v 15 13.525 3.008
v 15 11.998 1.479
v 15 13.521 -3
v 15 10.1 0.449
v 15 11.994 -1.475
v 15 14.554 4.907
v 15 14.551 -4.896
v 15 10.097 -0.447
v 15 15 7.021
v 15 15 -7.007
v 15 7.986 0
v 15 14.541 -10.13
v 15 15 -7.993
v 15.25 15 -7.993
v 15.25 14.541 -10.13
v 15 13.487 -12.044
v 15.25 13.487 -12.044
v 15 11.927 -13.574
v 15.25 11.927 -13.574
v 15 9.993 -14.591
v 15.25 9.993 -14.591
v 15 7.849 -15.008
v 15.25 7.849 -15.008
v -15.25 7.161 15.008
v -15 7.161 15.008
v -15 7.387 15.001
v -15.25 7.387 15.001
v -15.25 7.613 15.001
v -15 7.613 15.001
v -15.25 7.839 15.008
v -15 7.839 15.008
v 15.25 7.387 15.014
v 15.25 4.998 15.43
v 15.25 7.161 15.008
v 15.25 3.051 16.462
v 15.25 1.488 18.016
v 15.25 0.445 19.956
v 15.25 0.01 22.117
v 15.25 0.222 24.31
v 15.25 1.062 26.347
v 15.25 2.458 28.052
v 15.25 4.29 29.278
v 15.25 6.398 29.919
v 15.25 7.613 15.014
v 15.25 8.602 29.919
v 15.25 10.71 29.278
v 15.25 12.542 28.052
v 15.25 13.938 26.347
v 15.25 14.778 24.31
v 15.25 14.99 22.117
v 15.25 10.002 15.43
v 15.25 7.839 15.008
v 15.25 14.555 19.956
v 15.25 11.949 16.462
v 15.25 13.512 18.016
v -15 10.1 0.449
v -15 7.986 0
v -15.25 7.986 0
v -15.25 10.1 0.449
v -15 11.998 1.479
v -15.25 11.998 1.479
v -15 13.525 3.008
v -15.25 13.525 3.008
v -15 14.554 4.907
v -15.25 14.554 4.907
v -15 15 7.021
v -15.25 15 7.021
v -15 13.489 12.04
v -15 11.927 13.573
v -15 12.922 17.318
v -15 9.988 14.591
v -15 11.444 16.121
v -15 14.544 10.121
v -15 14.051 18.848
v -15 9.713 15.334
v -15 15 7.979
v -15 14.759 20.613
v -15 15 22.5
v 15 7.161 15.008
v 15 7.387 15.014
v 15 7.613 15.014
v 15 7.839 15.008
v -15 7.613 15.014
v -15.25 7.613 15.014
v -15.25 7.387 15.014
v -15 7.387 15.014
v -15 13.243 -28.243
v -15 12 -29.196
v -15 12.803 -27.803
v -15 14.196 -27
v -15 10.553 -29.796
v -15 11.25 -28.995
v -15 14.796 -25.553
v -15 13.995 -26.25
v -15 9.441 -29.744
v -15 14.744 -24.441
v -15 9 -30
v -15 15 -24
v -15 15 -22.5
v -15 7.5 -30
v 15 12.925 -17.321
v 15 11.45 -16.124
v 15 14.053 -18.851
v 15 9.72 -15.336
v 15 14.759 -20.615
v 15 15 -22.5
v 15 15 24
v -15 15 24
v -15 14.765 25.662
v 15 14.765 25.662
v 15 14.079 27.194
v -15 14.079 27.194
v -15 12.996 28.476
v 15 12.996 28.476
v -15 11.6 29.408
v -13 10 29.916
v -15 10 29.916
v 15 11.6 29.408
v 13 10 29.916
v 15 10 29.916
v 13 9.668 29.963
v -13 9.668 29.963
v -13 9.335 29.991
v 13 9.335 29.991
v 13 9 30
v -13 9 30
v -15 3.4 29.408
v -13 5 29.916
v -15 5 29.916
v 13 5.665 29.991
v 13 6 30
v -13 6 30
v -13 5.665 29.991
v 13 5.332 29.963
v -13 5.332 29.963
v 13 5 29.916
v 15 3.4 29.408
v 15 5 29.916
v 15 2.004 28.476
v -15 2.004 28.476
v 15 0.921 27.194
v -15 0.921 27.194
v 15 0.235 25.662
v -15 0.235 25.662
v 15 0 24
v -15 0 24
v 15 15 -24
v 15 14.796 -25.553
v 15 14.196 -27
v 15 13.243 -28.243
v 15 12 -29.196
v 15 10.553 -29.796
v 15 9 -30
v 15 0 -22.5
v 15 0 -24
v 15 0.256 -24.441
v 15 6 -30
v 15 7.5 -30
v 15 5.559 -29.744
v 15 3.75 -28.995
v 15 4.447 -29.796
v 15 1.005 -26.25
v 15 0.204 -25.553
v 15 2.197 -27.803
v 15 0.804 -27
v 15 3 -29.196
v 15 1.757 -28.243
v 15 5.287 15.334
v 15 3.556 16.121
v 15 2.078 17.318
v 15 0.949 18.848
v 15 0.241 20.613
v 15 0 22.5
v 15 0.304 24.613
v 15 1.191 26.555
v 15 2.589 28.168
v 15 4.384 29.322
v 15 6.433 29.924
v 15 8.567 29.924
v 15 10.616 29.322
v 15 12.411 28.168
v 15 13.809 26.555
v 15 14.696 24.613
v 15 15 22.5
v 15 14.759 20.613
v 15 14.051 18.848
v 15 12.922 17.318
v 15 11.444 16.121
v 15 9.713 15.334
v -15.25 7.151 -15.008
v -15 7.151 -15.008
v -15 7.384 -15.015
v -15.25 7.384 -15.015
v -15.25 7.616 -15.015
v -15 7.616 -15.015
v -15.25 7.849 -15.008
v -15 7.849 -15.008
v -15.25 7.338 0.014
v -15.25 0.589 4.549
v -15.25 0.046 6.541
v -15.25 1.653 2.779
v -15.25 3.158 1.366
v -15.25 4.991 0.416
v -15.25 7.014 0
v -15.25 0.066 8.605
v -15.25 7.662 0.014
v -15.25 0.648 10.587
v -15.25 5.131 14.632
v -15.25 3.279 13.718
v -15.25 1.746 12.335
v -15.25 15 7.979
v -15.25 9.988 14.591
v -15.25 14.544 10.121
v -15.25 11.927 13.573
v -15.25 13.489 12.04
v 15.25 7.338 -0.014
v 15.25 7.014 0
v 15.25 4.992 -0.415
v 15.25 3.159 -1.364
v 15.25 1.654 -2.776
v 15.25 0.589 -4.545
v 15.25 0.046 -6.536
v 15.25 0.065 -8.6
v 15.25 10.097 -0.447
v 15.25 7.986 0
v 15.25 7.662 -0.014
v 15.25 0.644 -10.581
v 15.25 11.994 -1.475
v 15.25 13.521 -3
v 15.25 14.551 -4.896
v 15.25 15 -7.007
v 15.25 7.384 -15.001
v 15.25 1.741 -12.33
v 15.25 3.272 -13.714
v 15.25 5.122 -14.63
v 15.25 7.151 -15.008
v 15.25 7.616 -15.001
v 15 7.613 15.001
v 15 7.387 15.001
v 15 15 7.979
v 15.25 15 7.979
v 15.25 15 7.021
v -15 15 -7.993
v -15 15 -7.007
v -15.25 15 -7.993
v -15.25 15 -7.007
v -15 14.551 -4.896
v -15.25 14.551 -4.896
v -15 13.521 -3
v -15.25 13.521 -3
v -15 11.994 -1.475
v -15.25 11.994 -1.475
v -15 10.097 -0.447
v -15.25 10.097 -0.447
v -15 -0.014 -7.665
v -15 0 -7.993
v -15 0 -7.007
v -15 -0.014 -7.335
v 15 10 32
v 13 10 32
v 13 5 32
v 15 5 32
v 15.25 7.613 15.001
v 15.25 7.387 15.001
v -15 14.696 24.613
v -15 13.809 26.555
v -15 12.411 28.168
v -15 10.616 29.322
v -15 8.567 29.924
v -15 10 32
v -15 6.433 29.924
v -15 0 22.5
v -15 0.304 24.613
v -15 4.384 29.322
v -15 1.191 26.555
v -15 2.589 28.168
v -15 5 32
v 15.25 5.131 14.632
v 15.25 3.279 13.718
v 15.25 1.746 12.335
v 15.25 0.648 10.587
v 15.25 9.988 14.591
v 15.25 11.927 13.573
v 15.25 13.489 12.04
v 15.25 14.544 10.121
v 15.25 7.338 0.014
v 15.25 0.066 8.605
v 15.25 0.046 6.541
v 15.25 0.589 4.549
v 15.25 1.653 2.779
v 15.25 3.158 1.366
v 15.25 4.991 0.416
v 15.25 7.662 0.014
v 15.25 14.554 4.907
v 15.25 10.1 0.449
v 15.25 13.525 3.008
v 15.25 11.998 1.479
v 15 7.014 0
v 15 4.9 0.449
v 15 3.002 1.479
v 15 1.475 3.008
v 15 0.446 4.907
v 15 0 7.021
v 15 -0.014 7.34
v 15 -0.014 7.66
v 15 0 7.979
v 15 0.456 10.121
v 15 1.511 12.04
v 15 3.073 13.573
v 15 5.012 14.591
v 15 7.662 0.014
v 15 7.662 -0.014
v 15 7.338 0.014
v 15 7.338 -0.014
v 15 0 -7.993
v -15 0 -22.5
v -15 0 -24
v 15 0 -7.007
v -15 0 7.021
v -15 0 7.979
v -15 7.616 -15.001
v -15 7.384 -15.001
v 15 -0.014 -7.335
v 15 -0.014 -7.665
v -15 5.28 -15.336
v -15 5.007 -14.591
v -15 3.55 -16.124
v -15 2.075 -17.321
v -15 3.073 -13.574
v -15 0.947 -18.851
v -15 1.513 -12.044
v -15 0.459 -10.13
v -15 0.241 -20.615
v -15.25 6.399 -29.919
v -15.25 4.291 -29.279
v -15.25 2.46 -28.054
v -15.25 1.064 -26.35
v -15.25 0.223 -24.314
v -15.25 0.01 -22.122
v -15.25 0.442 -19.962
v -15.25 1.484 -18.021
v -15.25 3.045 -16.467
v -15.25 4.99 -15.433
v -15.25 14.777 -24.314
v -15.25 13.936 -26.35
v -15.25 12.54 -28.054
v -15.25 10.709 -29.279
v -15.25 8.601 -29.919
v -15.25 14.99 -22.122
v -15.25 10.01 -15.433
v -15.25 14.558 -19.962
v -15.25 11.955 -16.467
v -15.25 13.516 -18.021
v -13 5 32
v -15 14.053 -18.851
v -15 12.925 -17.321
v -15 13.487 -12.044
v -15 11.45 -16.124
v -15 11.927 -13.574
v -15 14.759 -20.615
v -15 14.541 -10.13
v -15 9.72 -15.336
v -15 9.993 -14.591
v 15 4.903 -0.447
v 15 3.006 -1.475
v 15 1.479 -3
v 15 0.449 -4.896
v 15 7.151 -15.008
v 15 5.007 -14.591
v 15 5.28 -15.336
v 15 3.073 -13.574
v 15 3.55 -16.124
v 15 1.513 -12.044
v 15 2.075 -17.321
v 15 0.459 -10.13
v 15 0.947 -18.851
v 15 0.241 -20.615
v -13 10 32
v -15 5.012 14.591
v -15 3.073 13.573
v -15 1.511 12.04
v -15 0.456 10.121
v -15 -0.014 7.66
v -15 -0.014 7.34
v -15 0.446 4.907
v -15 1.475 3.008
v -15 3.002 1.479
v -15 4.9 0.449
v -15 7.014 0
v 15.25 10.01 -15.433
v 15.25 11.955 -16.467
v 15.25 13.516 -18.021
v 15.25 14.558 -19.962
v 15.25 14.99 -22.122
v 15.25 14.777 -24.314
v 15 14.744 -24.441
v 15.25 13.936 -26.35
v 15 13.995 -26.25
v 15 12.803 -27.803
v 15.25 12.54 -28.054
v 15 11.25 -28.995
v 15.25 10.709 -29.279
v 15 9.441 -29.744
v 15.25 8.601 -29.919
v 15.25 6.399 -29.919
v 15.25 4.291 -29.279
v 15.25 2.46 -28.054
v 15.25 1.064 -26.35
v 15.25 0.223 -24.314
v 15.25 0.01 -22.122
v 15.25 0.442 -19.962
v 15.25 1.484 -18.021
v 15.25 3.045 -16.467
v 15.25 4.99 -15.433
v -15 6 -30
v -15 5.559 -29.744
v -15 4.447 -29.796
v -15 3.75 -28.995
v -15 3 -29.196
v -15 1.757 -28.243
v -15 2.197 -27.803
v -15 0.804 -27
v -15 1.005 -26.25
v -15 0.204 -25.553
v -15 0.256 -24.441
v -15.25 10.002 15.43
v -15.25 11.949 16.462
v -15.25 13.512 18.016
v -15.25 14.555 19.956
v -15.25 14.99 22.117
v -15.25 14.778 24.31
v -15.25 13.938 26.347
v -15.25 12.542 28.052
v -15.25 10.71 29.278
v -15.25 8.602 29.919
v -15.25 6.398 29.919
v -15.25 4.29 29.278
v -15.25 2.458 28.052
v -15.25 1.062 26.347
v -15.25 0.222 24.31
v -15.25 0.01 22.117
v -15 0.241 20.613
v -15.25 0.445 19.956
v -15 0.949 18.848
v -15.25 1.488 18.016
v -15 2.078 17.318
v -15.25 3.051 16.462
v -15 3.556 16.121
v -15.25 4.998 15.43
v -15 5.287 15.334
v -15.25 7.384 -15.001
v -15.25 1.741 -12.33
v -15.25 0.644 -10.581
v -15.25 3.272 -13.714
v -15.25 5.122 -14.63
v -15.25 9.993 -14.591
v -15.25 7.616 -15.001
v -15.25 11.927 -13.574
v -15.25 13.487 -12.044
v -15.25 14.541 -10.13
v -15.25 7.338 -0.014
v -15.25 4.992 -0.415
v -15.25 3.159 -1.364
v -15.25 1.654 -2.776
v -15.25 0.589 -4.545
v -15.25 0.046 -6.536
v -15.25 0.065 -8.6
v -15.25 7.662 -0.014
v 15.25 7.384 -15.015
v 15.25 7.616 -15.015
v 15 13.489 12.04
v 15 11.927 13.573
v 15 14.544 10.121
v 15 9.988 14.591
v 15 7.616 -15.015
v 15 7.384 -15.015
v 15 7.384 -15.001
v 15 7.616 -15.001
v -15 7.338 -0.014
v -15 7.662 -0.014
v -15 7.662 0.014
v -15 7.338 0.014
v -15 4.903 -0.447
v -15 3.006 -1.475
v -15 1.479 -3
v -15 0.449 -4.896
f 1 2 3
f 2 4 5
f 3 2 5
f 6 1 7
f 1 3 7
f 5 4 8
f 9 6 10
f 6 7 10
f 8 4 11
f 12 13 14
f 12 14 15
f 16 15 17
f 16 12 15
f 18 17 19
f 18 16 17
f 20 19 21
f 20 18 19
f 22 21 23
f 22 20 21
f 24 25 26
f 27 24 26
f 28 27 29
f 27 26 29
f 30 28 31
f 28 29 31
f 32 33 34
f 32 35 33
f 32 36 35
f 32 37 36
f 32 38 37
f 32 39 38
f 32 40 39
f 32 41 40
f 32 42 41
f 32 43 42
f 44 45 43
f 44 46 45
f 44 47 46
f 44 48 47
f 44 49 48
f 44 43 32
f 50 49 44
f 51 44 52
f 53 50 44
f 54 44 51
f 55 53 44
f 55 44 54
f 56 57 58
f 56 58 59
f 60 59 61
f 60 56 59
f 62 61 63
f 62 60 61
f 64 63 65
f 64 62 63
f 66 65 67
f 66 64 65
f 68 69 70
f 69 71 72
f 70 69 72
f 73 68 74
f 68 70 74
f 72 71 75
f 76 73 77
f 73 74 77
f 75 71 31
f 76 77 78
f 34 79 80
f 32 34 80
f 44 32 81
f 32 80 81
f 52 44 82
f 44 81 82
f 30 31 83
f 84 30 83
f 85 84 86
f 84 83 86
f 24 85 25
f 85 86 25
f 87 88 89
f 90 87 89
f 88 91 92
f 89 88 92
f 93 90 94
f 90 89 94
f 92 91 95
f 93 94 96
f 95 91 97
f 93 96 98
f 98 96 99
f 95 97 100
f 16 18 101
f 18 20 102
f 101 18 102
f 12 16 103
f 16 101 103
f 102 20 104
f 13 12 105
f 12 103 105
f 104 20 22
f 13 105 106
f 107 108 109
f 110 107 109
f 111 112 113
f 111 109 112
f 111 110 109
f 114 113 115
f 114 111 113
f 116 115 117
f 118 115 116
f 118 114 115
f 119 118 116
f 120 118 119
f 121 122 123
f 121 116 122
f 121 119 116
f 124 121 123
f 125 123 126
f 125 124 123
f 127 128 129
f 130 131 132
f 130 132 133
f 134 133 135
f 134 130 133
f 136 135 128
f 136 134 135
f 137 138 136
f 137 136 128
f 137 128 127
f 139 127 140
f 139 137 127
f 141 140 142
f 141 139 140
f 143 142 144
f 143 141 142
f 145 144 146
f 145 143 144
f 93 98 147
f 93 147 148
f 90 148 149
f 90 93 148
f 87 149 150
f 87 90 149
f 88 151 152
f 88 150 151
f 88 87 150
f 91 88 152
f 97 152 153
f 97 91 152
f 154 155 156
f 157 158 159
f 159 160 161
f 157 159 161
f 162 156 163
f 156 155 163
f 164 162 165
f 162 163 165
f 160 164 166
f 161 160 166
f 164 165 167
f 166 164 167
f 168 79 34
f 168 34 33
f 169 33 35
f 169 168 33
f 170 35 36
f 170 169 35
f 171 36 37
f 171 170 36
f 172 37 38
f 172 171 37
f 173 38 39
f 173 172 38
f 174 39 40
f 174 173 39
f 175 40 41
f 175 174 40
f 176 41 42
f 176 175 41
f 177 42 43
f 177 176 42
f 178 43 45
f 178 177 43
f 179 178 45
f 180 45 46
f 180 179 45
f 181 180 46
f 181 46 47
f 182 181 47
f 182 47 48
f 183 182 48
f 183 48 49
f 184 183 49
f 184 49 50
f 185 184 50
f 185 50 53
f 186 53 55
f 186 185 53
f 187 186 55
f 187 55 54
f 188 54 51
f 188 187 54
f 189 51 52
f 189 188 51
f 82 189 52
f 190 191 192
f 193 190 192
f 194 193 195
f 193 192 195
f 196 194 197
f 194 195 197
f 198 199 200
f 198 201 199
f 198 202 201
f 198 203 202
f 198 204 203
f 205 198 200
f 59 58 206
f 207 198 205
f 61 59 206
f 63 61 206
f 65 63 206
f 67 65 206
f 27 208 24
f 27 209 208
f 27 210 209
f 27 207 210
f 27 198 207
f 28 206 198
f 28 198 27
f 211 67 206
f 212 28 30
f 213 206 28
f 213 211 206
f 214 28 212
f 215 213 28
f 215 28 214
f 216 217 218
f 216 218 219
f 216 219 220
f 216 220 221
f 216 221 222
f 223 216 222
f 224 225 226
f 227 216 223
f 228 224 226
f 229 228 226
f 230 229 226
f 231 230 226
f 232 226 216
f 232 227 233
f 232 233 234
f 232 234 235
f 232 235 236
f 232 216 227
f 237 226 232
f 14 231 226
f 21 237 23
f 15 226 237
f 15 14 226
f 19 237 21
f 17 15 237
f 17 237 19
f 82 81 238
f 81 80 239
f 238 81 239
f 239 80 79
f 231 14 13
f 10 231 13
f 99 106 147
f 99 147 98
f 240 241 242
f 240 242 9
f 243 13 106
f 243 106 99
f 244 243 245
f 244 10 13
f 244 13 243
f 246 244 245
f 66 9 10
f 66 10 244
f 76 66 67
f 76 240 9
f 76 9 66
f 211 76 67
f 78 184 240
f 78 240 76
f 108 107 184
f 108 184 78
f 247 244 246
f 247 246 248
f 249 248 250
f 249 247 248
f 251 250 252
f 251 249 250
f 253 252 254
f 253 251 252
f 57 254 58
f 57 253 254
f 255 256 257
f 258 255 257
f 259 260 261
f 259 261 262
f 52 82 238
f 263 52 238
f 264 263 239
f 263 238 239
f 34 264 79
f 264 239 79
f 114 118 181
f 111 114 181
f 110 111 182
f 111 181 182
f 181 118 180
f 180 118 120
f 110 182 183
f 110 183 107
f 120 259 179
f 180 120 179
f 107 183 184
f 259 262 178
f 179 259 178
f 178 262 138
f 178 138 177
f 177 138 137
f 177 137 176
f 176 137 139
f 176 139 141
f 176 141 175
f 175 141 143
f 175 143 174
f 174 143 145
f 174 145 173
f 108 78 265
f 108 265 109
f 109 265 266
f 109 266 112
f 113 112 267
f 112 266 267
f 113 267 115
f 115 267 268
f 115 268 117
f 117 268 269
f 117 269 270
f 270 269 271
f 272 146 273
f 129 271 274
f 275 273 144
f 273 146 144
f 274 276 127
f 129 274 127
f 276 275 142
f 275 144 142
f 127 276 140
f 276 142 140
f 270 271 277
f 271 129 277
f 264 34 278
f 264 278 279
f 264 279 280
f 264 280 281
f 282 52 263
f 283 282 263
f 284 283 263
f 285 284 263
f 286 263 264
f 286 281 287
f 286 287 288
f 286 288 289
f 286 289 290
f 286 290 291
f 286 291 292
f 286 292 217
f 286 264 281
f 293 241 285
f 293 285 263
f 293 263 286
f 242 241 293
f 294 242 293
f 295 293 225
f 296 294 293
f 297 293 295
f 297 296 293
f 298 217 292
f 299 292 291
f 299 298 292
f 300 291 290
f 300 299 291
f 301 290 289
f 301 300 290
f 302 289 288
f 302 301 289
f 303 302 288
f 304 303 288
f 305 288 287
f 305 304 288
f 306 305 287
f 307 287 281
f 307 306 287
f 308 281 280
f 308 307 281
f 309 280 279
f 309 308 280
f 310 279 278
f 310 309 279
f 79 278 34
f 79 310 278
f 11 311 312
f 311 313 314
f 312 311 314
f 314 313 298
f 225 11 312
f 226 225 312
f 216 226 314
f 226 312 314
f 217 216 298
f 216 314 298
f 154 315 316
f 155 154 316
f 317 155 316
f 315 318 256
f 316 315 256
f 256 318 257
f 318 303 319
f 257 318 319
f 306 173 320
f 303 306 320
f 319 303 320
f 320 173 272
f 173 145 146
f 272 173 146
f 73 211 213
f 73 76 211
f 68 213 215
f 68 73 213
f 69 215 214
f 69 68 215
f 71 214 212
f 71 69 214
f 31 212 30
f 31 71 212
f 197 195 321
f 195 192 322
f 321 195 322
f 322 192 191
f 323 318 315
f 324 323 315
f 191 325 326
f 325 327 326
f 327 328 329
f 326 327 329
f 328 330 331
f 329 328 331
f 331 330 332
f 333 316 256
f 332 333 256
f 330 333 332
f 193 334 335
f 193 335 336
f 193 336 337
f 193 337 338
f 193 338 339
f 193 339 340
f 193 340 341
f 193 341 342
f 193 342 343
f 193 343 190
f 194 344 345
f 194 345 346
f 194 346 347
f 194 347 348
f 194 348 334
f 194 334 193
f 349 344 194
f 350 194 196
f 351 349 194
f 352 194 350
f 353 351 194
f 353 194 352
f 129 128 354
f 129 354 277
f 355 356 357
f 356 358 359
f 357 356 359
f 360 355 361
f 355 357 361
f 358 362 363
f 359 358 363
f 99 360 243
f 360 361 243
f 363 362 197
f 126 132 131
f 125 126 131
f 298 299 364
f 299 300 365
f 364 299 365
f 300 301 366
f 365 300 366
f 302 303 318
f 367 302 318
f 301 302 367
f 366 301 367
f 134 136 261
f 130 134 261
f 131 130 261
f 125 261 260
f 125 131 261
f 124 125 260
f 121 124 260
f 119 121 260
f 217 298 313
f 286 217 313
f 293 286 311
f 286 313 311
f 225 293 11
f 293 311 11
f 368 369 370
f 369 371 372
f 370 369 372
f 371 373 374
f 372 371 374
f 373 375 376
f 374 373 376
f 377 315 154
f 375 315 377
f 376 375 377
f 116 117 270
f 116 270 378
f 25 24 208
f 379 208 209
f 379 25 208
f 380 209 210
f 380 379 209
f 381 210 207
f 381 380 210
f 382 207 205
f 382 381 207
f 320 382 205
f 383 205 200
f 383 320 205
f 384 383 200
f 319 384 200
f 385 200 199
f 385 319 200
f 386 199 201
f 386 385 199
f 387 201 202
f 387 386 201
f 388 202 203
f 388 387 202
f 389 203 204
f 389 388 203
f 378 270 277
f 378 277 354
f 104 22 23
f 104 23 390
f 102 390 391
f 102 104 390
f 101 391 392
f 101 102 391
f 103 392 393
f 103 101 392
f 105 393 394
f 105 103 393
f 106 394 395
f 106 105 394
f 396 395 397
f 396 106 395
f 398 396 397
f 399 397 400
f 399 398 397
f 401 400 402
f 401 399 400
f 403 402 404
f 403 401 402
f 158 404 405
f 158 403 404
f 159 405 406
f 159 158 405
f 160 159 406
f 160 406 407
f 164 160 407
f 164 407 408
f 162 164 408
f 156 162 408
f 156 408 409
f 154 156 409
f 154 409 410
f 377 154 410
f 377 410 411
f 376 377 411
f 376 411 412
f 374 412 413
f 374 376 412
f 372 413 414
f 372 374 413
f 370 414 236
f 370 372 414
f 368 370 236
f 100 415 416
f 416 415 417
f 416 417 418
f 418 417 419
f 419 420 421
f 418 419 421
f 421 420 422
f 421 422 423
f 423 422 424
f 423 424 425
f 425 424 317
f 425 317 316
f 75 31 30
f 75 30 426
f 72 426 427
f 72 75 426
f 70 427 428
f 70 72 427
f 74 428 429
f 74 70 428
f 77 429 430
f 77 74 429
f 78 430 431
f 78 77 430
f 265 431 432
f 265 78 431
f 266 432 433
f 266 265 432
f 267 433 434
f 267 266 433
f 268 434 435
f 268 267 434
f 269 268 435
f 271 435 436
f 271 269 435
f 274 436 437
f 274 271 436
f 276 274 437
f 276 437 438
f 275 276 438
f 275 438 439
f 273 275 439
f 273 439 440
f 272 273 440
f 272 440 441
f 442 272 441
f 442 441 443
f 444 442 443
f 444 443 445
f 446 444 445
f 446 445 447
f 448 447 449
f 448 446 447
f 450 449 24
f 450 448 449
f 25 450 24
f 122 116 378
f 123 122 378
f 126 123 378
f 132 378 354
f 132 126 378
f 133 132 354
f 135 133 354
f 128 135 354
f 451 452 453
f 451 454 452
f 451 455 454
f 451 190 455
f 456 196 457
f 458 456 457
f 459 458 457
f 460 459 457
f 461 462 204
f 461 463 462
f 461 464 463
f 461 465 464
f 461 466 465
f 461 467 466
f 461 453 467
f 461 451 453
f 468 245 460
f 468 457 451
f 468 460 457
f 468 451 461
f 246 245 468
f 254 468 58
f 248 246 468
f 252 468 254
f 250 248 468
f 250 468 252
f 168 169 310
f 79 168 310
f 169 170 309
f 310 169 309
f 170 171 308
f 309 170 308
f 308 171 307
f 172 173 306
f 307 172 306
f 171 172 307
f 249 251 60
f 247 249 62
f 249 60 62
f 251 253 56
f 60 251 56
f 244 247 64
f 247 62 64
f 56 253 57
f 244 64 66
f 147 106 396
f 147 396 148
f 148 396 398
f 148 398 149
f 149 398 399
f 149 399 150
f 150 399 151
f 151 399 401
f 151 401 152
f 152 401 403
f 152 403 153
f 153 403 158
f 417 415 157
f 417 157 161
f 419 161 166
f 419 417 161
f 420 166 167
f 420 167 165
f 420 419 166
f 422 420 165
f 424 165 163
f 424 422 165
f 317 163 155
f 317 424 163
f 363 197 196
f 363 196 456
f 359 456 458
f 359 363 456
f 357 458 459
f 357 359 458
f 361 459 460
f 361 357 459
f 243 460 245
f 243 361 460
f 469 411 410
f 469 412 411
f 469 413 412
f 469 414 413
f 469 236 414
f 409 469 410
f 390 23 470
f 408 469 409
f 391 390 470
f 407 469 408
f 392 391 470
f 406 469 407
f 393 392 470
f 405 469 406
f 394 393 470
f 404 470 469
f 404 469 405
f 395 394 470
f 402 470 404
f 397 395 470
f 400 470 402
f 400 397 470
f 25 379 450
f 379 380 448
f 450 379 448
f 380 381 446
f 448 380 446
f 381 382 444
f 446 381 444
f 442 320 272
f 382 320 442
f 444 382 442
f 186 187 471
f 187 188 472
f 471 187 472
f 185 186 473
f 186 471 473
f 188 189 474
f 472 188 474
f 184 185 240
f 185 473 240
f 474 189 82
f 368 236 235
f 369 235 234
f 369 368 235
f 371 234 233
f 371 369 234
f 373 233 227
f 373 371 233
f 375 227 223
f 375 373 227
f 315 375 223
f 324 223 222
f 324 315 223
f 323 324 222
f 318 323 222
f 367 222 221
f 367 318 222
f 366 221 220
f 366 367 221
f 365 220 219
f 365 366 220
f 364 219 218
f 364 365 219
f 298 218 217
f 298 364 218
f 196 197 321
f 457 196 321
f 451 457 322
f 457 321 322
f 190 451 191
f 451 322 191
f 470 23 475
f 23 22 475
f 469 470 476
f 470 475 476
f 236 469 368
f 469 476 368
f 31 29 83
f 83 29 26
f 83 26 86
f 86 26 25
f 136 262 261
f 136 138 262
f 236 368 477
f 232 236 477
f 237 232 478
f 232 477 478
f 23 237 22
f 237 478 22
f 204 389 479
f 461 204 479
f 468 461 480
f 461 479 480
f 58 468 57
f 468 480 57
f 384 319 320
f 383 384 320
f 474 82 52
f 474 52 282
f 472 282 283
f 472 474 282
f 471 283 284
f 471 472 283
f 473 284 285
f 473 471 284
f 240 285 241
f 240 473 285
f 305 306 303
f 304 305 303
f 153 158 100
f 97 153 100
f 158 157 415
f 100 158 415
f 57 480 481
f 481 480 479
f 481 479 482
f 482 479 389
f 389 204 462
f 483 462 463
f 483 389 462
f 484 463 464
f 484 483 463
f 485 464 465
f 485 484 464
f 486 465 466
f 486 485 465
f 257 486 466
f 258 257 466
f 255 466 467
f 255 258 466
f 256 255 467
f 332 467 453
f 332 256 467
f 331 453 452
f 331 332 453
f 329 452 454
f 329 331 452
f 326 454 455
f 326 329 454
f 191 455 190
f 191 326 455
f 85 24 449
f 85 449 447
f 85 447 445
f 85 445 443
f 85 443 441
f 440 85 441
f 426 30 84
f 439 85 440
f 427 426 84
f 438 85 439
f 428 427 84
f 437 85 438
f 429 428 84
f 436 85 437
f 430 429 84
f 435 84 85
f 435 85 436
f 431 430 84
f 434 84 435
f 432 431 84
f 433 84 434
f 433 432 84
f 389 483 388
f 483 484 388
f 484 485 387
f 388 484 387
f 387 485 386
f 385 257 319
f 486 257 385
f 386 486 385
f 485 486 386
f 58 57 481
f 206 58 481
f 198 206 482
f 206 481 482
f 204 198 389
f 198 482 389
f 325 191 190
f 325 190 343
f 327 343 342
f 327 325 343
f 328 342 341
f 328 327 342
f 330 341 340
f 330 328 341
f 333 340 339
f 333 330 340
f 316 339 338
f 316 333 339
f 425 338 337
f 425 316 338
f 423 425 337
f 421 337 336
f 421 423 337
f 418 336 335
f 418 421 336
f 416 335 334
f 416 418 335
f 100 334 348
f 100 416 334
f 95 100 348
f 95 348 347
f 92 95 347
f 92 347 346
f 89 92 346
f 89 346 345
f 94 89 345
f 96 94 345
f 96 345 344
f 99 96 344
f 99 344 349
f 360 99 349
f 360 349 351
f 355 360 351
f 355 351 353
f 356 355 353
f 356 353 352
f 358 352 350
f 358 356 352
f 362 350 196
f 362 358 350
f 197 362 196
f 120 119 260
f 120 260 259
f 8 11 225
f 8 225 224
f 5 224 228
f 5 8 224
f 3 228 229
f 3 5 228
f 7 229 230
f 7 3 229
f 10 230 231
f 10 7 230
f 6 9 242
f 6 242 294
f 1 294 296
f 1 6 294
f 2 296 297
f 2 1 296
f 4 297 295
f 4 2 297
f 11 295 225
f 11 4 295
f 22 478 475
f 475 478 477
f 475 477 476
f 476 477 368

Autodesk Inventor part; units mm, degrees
ref_plane "YZ Plane" through (0, 0, 0) normal (1, 0, 0) x (0, 1, 0)
ref_plane "XZ Plane" through (0, 0, 0) normal (0, 1, 0) x (-1, 0, 0)
sketch "Sketch1" plane through (0, 0, 0) normal (0, 1, 0) x (-1, 0, 0)
  line L0 (15, 30) -> (-15, 30)
  line L1 (-15, 30) -> (-15, -30)
  line L2 (-15, -30) -> (15, -30)
  line L3 (15, -30) -> (15, 30)
  point P0 (0, 0)
  dimension "d0" = 30
  dimension "d1" = 60
  dimension "d2" = 30
  dimension "d3" = 15
extrude "Extrusion1" add sketch "Sketch1" along normal blind 15
sketch "Sketch2" plane through (-15, 0, 30) normal (0, 0, 1) x (1, 0, 0)
  line L0 (0, 0) -> (0, 15) projected
  line L1 (0, 10) -> (2, 10)
  line L2 (2, 10) -> (2, 5)
  line L3 (2, 5) -> (0, 5)
  line L4 (0, 5) -> (0, 10)
  line L5 (0, 15) -> (30, 15) projected
  line L6 (30, 0) -> (30, 15) projected
  line L7 (28, 10) -> (30, 10)
  line L8 (30, 10) -> (30, 5)
  line L9 (30, 5) -> (28, 5)
  line L10 (28, 5) -> (28, 10)
  point P0 (15, 0)
  point P1 (0, 5)
  dimension "d6" = 2
  dimension "d7" = 5
  dimension "d8" = 5
  dimension "d9" = 2
  dimension "d10" = 5
  dimension "d11" = 5
extrude "Extrusion2" add sketch "Sketch2" along normal blind 2
fillet "Fillet1" radius 6 4 edges at (0, 15, 30) (0, 0, 30) (0, 15, -30) (0, 0, -30)
sketch "Sketch3" plane through (15, 5, 32) normal (1, 0, 0) x (0, 0, -1)
  line L0 (62, 1) -> (62, 4) projected
  line L1 (62, 2.5) -> (0, 2.5)
  line L2 (0, 5) -> (0, 0) projected
  circle A0 centre (9.5, 2.5) radius 7.5
  line L3 (8, 10) -> (56, 10) projected
  circle A1 centre (24.5, 2.5) radius 7.5153
  circle A2 centre (39.5, 2.5) radius 7.5162
  circle A3 centre (54.5, 2.5) radius 7.5
  point P0 (32, -5)
  point P1 (47.0081, 2.8488)
  point P2 (47.0081, 2.1512)
  point P3 (39.9933, 10)
  point P4 (39.0067, 10)
  point P5 (31.9995, 2.9861)
  point P6 (31.9995, 2.0139)
  point P7 (24.9788, 10)
  point P8 (24.0212, 10)
  point P9 (16.9924, 2.8385)
  point P10 (16.9924, 2.1615)
  dimension "d15" = 15
  dimension "d16" = 15
  dimension "d17" = 15
  dimension "d18" = 15
  dimension "d19" = 7.5
extrude "Extrusion3" add sketch "Sketch3" along normal blind 0.25 contours A3 A2 L1 | L1 A2 A3 | A2 A1 L1 A3 | L1 A1 A2 L3 A3 | A1 A0 L1 A2 | A0 L1 A1 | L1 A0 A1 L3 A2 | A0 A1 L1 picked at (56.9349, 1.9104) picked at (56.9427, 3.0563) picked at (7.0655, 1.9102) picked at (7.0576, 3.0563)
ref_plane "Work Plane1" through (0, 15, 22.5) normal (1, 0, 0) x (0, 0, -1)
mirror "Mirror1" about plane through (0, 15, 22.5) normal (1, 0, 0) of "Extrusion3"
equation "\"d2\" = 0.5 * d1"
equation "\"d3\" = 0.5 * d0"
properties part number "Battery_template"
